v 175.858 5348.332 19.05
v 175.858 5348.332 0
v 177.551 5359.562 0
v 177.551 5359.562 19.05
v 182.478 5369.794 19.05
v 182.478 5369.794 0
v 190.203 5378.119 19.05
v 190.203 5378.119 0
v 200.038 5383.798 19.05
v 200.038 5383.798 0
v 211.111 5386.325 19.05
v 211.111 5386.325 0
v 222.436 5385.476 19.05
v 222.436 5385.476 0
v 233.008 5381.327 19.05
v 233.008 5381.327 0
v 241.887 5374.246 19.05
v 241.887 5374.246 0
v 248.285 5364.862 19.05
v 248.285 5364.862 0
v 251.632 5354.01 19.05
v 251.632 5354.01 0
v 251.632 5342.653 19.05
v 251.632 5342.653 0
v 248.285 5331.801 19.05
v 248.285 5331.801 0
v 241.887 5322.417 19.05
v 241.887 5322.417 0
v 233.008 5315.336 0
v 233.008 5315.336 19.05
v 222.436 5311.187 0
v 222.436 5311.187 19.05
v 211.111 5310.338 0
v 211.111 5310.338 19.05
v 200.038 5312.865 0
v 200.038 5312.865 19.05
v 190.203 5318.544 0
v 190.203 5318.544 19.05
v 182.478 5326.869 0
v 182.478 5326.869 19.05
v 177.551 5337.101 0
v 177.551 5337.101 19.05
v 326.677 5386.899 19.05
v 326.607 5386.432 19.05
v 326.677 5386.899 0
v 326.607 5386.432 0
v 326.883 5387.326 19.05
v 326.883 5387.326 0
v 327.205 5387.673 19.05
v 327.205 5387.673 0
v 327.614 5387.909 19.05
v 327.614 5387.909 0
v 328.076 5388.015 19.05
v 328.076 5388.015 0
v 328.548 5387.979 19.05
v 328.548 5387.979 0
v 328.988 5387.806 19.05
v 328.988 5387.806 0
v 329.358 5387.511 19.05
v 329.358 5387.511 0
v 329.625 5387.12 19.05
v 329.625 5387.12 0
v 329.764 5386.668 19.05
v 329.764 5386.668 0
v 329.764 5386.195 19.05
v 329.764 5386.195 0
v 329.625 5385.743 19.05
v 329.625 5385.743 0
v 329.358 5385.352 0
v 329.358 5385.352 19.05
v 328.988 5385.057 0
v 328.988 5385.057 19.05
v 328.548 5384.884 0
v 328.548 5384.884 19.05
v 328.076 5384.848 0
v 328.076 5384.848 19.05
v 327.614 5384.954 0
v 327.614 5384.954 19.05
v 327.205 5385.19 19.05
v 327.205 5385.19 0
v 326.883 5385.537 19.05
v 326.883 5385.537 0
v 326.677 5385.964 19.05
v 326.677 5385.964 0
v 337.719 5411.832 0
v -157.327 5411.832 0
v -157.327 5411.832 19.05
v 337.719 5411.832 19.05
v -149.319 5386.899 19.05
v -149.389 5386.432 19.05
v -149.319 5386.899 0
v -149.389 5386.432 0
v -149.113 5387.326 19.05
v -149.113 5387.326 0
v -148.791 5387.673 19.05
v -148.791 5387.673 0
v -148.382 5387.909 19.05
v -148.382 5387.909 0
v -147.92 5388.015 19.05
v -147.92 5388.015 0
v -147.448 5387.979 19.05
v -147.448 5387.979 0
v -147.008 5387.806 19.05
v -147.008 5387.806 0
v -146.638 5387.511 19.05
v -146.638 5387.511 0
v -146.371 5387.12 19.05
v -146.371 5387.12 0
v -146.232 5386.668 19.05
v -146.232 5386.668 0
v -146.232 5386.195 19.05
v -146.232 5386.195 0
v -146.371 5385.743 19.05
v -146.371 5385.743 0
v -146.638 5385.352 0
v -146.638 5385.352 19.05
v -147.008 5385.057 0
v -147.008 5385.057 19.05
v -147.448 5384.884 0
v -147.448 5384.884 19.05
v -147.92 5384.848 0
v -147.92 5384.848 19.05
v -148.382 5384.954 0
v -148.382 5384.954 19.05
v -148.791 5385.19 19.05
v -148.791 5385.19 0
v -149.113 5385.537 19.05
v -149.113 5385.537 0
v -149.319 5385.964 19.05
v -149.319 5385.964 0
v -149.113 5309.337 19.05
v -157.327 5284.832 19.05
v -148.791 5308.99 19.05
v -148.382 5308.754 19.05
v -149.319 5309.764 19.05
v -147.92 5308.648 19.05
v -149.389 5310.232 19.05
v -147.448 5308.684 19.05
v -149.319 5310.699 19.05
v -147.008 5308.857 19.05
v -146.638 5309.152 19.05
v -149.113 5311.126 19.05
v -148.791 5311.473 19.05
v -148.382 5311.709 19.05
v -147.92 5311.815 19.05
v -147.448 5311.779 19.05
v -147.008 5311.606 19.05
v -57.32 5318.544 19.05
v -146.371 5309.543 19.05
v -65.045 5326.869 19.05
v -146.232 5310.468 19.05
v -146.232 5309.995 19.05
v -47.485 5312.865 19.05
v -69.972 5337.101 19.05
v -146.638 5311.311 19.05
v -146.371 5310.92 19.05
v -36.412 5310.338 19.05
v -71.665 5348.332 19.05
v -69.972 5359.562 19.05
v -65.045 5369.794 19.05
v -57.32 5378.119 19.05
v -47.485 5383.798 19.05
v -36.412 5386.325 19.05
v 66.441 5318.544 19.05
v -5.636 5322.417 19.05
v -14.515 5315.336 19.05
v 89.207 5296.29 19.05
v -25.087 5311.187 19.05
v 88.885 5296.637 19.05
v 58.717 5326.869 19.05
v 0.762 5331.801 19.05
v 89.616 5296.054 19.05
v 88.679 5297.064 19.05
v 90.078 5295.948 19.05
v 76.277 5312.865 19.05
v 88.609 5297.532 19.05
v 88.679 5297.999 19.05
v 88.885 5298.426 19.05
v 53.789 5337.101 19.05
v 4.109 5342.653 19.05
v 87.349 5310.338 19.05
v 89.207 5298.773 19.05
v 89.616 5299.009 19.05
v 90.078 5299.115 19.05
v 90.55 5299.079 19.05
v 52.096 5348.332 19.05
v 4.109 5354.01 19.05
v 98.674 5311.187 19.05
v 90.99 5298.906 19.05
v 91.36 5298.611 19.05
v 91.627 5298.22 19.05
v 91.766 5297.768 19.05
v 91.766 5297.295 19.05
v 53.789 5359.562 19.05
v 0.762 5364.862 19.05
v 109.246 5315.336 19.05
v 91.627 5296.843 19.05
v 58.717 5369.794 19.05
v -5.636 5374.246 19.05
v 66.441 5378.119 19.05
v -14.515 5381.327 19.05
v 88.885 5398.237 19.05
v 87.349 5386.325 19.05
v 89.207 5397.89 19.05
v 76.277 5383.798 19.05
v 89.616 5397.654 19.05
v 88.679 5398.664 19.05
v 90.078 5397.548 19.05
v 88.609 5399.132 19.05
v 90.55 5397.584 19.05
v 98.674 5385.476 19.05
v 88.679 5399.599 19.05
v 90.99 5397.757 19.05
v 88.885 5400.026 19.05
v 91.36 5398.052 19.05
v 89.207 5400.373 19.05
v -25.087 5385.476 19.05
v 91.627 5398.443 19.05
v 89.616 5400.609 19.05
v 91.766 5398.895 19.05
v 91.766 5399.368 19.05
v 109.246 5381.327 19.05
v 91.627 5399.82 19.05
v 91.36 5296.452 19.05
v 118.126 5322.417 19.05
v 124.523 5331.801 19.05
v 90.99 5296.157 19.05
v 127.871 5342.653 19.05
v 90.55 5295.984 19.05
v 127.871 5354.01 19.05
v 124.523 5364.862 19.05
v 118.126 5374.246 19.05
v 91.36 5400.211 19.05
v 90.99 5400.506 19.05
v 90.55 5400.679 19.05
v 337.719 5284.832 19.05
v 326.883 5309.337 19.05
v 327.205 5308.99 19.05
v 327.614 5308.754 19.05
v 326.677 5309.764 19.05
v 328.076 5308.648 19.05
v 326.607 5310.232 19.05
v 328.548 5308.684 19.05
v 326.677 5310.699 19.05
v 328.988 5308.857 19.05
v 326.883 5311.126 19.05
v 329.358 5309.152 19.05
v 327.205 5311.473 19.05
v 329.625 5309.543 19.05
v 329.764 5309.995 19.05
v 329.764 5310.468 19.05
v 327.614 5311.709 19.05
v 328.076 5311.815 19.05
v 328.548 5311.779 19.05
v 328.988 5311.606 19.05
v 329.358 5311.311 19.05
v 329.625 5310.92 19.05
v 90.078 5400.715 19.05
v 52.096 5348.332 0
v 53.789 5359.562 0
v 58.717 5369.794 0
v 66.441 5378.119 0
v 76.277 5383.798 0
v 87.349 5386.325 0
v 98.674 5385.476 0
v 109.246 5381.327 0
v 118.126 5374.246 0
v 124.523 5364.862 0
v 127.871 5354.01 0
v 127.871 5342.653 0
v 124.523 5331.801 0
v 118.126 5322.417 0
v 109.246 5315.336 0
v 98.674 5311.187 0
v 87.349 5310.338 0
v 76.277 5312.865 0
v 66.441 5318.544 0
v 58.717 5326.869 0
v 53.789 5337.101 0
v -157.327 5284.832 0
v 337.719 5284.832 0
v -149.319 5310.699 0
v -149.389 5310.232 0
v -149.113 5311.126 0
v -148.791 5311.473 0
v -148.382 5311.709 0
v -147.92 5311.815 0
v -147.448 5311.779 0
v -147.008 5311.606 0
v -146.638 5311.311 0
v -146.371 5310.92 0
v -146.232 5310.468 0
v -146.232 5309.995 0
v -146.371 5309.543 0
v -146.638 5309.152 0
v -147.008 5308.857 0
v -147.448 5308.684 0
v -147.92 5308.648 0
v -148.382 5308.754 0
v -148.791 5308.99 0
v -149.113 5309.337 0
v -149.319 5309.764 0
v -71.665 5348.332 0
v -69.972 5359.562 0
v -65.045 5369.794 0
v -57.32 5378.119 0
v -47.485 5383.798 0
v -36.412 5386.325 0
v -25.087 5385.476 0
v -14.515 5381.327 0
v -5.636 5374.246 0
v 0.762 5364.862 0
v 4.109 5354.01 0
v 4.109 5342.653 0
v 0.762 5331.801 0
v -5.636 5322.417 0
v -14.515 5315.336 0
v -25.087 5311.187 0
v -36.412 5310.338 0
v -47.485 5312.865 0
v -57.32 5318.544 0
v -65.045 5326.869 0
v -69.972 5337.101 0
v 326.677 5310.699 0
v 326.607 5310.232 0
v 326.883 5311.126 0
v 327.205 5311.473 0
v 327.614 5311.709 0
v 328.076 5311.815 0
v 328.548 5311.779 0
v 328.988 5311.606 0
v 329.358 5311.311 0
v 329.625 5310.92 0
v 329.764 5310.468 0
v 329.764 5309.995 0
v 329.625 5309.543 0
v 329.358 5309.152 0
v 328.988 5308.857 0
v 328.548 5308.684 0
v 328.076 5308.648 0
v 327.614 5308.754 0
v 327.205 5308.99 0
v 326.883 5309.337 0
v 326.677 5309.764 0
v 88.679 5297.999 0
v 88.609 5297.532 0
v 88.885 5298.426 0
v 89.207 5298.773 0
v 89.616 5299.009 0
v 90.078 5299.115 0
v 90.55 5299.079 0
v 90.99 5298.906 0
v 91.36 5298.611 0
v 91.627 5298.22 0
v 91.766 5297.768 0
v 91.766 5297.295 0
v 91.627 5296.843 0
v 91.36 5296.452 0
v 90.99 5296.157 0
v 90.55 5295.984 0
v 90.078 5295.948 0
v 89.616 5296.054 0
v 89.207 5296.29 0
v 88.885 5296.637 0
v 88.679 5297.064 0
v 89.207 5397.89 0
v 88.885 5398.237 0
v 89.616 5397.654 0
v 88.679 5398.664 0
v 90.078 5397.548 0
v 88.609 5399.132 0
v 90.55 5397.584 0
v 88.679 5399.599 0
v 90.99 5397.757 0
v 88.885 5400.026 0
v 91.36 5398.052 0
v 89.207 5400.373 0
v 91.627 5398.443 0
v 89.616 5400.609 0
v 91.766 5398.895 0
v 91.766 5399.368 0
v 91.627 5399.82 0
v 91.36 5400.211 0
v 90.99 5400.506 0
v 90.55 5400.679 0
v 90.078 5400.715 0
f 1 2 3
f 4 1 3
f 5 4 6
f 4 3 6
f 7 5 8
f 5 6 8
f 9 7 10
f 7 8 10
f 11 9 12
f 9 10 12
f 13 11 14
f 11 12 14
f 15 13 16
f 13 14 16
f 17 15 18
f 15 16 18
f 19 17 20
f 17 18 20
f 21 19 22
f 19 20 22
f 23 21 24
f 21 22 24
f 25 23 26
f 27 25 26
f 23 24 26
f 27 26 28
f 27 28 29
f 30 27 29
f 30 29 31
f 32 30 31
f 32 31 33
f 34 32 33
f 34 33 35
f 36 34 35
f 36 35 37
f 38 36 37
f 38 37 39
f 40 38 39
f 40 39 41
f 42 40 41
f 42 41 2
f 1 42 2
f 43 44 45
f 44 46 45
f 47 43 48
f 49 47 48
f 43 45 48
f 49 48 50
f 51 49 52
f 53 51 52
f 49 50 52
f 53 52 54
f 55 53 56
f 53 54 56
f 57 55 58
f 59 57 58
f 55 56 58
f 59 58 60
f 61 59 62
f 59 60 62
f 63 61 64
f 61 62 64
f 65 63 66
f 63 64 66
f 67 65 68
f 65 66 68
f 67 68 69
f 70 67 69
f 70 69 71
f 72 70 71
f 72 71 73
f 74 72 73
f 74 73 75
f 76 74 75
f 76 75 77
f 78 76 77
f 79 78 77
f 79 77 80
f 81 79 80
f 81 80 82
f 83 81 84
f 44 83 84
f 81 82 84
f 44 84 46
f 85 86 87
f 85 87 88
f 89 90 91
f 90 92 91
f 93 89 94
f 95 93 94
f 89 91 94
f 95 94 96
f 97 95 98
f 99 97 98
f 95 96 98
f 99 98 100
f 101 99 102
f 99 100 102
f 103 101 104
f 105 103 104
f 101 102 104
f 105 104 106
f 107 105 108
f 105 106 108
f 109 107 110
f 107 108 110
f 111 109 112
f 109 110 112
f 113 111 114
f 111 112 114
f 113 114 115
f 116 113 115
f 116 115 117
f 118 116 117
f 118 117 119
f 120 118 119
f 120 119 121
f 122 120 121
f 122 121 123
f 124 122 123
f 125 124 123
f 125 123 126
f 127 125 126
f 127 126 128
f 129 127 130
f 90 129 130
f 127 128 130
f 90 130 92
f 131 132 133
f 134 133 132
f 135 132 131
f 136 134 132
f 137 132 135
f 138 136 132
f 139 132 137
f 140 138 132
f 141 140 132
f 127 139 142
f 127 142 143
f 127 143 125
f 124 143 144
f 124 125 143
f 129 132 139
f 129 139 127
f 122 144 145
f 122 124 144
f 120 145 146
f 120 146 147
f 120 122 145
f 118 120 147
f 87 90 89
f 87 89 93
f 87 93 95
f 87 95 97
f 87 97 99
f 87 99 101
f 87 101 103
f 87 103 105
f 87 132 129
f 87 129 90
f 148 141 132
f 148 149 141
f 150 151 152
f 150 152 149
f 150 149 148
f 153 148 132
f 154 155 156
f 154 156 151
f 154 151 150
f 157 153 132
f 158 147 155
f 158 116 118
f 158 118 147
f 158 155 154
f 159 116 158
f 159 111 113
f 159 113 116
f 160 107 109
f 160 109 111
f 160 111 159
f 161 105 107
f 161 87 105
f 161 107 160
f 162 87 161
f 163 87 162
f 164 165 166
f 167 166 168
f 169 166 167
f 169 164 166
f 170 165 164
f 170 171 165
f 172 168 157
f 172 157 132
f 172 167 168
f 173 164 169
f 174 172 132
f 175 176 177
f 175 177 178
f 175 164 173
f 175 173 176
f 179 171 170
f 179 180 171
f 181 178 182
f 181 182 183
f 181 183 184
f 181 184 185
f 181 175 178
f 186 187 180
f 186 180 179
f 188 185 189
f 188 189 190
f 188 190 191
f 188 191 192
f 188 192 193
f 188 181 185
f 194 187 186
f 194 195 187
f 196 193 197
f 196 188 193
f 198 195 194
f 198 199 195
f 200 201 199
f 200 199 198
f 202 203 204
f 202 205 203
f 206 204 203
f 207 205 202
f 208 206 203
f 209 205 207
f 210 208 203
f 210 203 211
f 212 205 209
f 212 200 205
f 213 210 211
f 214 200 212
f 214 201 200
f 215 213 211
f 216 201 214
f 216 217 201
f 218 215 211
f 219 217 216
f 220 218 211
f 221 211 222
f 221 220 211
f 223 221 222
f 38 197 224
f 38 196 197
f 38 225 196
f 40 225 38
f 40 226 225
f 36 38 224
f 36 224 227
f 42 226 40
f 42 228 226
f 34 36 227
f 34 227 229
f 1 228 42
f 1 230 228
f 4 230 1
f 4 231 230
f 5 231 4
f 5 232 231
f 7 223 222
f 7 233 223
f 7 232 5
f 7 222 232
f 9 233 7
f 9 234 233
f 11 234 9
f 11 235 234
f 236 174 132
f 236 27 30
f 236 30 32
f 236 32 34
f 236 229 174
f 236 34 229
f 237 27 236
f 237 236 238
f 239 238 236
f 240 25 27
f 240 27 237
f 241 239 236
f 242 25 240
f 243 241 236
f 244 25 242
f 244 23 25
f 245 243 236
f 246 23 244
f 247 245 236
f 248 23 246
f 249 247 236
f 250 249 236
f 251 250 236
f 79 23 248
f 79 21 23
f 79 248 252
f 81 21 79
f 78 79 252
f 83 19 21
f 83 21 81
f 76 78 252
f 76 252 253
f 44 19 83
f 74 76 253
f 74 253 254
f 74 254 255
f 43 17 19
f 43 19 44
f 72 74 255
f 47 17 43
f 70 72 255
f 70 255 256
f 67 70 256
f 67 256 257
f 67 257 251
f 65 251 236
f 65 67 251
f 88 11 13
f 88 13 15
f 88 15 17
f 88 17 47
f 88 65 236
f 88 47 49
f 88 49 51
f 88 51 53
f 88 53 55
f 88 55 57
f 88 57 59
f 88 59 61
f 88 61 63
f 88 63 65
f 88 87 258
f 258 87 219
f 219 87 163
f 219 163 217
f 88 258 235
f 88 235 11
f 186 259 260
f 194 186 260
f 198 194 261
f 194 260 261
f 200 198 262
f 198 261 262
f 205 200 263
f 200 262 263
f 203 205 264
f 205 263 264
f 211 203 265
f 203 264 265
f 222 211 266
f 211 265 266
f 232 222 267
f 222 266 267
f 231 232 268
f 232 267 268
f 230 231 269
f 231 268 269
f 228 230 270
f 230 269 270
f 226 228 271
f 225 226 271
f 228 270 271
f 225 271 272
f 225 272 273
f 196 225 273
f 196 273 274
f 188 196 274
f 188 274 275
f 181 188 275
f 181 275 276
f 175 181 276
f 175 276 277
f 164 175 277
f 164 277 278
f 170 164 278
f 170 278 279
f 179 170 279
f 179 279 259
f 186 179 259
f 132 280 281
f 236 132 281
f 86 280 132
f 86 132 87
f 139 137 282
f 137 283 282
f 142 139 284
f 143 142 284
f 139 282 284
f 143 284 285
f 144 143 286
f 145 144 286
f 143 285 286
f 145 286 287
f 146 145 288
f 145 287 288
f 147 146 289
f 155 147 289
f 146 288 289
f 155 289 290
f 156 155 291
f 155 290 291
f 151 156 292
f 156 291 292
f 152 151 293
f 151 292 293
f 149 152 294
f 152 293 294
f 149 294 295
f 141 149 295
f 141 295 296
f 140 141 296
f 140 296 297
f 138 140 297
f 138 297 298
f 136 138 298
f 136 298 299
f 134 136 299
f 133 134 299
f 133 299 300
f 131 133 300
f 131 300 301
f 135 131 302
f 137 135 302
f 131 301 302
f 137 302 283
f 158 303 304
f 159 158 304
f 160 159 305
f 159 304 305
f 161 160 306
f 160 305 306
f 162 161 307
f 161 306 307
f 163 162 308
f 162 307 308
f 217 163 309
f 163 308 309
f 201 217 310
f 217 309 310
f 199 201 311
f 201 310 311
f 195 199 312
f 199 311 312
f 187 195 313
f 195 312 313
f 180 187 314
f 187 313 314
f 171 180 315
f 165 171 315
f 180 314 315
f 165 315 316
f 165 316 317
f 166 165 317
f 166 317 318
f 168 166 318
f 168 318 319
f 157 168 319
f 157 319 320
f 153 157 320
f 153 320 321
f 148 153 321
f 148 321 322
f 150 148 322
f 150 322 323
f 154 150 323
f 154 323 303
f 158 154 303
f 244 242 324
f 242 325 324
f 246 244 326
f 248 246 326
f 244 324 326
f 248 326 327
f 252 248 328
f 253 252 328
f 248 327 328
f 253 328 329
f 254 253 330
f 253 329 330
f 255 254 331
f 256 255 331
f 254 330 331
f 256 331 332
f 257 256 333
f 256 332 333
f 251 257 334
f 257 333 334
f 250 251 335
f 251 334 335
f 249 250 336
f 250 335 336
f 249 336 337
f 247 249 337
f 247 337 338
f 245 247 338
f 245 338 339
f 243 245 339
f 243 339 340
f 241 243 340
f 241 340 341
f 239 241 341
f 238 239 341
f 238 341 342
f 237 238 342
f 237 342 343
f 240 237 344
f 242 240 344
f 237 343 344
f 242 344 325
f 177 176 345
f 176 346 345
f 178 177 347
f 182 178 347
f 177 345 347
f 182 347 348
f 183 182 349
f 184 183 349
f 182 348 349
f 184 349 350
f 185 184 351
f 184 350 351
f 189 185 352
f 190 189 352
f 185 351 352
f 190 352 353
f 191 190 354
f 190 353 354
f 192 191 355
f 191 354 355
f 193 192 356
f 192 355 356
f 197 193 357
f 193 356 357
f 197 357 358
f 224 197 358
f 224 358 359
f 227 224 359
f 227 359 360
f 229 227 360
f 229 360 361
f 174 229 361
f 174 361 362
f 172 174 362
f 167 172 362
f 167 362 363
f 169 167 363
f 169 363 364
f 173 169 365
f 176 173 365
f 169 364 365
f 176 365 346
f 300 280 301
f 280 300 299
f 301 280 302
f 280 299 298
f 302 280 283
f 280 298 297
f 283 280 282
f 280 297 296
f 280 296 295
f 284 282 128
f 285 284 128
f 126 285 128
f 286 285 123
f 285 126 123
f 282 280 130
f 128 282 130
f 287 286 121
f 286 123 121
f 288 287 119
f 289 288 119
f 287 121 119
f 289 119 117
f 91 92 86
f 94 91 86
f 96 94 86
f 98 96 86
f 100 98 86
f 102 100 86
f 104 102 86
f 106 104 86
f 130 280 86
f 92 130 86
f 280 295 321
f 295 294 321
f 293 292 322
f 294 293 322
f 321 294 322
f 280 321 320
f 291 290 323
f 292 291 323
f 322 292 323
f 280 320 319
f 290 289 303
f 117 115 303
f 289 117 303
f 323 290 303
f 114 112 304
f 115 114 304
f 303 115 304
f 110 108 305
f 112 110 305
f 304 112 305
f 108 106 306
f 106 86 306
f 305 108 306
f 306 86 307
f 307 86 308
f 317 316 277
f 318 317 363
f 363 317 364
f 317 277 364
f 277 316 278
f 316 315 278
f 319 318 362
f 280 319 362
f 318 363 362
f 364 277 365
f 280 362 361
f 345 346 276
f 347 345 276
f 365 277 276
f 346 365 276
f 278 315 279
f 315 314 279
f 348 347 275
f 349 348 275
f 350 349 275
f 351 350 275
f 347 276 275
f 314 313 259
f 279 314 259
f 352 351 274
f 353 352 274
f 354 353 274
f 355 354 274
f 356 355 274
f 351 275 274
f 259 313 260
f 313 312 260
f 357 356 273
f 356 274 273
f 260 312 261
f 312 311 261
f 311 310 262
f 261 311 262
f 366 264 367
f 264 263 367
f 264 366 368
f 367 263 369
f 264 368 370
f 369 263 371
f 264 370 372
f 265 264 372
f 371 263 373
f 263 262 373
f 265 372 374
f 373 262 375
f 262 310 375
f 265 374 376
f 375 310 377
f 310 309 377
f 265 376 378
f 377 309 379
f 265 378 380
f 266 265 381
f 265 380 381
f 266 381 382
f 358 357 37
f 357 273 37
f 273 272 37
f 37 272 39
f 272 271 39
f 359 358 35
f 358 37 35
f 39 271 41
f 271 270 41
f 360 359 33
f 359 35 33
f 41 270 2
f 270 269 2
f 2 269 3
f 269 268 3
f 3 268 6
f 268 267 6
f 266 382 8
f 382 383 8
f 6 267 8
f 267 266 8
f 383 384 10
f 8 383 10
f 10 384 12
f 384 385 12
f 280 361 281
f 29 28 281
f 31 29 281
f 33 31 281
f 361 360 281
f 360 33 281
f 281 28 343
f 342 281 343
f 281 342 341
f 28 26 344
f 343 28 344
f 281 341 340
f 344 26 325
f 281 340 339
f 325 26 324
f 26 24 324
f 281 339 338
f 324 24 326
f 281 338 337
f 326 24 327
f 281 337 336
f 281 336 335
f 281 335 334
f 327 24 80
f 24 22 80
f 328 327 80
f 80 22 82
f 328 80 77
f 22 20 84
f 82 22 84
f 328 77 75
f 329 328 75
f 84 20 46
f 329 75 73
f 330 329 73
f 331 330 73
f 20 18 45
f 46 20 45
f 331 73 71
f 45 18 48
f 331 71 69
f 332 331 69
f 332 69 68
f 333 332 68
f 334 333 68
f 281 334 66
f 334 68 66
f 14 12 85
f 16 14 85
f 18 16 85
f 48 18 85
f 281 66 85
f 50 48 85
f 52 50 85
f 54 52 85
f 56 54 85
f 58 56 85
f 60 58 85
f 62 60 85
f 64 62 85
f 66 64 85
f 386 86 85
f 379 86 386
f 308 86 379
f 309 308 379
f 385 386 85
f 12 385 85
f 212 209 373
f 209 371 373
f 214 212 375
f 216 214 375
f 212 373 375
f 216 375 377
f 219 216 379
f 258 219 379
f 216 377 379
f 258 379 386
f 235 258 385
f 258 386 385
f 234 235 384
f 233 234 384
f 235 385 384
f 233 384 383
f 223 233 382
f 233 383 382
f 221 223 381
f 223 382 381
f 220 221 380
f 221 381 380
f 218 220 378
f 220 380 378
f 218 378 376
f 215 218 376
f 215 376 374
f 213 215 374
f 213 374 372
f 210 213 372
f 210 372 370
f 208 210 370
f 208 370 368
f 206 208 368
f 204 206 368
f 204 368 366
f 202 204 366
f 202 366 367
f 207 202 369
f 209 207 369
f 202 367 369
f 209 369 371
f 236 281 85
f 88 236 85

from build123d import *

# Parameters (mm, degrees)
SKETCH1_W           = 495.046
SKETCH1_H           = 127
BOSS_EXTRUDE1_DEPTH = 19.05
SKETCH2_R           = 38.1
CUT_EXTRUDE1_DEPTH  = 5423.392257673
HOLE1_D             = 3.175
HOLE1_DEPTH         = 50.8
HOLE1_CSINK_D       = 10.16
HOLE1_CSINK_ANGLE   = 82
HOLE1_TIP           = 0.953866233


with BuildPart() as part:
    # Sketch1 → Boss-Extrude1 (new body)
    with BuildSketch(Plane.XY):
        with Locations((90.196398512, 5348.331529292)):
            Rectangle(SKETCH1_W, SKETCH1_H)
    extrude(amount=BOSS_EXTRUDE1_DEPTH)

    # Sketch2 → Cut-Extrude1 (cut, through all)
    with BuildSketch(Plane(origin=(0, 0, 0), x_dir=(-1, 0, 0), z_dir=(0, 0, -1))):
        with Locations((-213.957898512, 5348.331529292)):
            Circle(SKETCH2_R)
        with Locations((-90.196398512, 5348.331529292)):
            Circle(SKETCH2_R)
        with Locations((33.565101488, 5348.331529292)):
            Circle(SKETCH2_R)
    extrude(amount=-CUT_EXTRUDE1_DEPTH, mode=Mode.SUBTRACT)

    # Hole1
    with Locations(Plane(origin=(90.196398512, 2347.321529292, 38.1), x_dir=(1, 0, 0), z_dir=(0, 0, 1))):
        with Locations((0, 2696.21), (-237.998, 3089.91), (-237.998, 3039.11), (-237.998, 2962.91), (-237.998, 2912.11), (-237.998, 2835.91), (-237.998, 2785.11), (-237.998, 2708.91), (237.998, 2708.91), (237.998, 2785.11), (237.998, 2835.91), (237.998, 2912.11), (237.998, 2962.91), (237.998, 3039.11), (237.998, 3089.91), (0, 3051.81), (0, 2950.21), (0, 2797.81)):
            CounterSinkHole(HOLE1_D / 2, HOLE1_CSINK_D / 2, depth=HOLE1_DEPTH, counter_sink_angle=HOLE1_CSINK_ANGLE)
            with Locations((0, 0, -(HOLE1_DEPTH + HOLE1_TIP / 2))):  # 118° drill point
                Cone(0, HOLE1_D / 2, HOLE1_TIP, mode=Mode.SUBTRACT)


solid = part.part
